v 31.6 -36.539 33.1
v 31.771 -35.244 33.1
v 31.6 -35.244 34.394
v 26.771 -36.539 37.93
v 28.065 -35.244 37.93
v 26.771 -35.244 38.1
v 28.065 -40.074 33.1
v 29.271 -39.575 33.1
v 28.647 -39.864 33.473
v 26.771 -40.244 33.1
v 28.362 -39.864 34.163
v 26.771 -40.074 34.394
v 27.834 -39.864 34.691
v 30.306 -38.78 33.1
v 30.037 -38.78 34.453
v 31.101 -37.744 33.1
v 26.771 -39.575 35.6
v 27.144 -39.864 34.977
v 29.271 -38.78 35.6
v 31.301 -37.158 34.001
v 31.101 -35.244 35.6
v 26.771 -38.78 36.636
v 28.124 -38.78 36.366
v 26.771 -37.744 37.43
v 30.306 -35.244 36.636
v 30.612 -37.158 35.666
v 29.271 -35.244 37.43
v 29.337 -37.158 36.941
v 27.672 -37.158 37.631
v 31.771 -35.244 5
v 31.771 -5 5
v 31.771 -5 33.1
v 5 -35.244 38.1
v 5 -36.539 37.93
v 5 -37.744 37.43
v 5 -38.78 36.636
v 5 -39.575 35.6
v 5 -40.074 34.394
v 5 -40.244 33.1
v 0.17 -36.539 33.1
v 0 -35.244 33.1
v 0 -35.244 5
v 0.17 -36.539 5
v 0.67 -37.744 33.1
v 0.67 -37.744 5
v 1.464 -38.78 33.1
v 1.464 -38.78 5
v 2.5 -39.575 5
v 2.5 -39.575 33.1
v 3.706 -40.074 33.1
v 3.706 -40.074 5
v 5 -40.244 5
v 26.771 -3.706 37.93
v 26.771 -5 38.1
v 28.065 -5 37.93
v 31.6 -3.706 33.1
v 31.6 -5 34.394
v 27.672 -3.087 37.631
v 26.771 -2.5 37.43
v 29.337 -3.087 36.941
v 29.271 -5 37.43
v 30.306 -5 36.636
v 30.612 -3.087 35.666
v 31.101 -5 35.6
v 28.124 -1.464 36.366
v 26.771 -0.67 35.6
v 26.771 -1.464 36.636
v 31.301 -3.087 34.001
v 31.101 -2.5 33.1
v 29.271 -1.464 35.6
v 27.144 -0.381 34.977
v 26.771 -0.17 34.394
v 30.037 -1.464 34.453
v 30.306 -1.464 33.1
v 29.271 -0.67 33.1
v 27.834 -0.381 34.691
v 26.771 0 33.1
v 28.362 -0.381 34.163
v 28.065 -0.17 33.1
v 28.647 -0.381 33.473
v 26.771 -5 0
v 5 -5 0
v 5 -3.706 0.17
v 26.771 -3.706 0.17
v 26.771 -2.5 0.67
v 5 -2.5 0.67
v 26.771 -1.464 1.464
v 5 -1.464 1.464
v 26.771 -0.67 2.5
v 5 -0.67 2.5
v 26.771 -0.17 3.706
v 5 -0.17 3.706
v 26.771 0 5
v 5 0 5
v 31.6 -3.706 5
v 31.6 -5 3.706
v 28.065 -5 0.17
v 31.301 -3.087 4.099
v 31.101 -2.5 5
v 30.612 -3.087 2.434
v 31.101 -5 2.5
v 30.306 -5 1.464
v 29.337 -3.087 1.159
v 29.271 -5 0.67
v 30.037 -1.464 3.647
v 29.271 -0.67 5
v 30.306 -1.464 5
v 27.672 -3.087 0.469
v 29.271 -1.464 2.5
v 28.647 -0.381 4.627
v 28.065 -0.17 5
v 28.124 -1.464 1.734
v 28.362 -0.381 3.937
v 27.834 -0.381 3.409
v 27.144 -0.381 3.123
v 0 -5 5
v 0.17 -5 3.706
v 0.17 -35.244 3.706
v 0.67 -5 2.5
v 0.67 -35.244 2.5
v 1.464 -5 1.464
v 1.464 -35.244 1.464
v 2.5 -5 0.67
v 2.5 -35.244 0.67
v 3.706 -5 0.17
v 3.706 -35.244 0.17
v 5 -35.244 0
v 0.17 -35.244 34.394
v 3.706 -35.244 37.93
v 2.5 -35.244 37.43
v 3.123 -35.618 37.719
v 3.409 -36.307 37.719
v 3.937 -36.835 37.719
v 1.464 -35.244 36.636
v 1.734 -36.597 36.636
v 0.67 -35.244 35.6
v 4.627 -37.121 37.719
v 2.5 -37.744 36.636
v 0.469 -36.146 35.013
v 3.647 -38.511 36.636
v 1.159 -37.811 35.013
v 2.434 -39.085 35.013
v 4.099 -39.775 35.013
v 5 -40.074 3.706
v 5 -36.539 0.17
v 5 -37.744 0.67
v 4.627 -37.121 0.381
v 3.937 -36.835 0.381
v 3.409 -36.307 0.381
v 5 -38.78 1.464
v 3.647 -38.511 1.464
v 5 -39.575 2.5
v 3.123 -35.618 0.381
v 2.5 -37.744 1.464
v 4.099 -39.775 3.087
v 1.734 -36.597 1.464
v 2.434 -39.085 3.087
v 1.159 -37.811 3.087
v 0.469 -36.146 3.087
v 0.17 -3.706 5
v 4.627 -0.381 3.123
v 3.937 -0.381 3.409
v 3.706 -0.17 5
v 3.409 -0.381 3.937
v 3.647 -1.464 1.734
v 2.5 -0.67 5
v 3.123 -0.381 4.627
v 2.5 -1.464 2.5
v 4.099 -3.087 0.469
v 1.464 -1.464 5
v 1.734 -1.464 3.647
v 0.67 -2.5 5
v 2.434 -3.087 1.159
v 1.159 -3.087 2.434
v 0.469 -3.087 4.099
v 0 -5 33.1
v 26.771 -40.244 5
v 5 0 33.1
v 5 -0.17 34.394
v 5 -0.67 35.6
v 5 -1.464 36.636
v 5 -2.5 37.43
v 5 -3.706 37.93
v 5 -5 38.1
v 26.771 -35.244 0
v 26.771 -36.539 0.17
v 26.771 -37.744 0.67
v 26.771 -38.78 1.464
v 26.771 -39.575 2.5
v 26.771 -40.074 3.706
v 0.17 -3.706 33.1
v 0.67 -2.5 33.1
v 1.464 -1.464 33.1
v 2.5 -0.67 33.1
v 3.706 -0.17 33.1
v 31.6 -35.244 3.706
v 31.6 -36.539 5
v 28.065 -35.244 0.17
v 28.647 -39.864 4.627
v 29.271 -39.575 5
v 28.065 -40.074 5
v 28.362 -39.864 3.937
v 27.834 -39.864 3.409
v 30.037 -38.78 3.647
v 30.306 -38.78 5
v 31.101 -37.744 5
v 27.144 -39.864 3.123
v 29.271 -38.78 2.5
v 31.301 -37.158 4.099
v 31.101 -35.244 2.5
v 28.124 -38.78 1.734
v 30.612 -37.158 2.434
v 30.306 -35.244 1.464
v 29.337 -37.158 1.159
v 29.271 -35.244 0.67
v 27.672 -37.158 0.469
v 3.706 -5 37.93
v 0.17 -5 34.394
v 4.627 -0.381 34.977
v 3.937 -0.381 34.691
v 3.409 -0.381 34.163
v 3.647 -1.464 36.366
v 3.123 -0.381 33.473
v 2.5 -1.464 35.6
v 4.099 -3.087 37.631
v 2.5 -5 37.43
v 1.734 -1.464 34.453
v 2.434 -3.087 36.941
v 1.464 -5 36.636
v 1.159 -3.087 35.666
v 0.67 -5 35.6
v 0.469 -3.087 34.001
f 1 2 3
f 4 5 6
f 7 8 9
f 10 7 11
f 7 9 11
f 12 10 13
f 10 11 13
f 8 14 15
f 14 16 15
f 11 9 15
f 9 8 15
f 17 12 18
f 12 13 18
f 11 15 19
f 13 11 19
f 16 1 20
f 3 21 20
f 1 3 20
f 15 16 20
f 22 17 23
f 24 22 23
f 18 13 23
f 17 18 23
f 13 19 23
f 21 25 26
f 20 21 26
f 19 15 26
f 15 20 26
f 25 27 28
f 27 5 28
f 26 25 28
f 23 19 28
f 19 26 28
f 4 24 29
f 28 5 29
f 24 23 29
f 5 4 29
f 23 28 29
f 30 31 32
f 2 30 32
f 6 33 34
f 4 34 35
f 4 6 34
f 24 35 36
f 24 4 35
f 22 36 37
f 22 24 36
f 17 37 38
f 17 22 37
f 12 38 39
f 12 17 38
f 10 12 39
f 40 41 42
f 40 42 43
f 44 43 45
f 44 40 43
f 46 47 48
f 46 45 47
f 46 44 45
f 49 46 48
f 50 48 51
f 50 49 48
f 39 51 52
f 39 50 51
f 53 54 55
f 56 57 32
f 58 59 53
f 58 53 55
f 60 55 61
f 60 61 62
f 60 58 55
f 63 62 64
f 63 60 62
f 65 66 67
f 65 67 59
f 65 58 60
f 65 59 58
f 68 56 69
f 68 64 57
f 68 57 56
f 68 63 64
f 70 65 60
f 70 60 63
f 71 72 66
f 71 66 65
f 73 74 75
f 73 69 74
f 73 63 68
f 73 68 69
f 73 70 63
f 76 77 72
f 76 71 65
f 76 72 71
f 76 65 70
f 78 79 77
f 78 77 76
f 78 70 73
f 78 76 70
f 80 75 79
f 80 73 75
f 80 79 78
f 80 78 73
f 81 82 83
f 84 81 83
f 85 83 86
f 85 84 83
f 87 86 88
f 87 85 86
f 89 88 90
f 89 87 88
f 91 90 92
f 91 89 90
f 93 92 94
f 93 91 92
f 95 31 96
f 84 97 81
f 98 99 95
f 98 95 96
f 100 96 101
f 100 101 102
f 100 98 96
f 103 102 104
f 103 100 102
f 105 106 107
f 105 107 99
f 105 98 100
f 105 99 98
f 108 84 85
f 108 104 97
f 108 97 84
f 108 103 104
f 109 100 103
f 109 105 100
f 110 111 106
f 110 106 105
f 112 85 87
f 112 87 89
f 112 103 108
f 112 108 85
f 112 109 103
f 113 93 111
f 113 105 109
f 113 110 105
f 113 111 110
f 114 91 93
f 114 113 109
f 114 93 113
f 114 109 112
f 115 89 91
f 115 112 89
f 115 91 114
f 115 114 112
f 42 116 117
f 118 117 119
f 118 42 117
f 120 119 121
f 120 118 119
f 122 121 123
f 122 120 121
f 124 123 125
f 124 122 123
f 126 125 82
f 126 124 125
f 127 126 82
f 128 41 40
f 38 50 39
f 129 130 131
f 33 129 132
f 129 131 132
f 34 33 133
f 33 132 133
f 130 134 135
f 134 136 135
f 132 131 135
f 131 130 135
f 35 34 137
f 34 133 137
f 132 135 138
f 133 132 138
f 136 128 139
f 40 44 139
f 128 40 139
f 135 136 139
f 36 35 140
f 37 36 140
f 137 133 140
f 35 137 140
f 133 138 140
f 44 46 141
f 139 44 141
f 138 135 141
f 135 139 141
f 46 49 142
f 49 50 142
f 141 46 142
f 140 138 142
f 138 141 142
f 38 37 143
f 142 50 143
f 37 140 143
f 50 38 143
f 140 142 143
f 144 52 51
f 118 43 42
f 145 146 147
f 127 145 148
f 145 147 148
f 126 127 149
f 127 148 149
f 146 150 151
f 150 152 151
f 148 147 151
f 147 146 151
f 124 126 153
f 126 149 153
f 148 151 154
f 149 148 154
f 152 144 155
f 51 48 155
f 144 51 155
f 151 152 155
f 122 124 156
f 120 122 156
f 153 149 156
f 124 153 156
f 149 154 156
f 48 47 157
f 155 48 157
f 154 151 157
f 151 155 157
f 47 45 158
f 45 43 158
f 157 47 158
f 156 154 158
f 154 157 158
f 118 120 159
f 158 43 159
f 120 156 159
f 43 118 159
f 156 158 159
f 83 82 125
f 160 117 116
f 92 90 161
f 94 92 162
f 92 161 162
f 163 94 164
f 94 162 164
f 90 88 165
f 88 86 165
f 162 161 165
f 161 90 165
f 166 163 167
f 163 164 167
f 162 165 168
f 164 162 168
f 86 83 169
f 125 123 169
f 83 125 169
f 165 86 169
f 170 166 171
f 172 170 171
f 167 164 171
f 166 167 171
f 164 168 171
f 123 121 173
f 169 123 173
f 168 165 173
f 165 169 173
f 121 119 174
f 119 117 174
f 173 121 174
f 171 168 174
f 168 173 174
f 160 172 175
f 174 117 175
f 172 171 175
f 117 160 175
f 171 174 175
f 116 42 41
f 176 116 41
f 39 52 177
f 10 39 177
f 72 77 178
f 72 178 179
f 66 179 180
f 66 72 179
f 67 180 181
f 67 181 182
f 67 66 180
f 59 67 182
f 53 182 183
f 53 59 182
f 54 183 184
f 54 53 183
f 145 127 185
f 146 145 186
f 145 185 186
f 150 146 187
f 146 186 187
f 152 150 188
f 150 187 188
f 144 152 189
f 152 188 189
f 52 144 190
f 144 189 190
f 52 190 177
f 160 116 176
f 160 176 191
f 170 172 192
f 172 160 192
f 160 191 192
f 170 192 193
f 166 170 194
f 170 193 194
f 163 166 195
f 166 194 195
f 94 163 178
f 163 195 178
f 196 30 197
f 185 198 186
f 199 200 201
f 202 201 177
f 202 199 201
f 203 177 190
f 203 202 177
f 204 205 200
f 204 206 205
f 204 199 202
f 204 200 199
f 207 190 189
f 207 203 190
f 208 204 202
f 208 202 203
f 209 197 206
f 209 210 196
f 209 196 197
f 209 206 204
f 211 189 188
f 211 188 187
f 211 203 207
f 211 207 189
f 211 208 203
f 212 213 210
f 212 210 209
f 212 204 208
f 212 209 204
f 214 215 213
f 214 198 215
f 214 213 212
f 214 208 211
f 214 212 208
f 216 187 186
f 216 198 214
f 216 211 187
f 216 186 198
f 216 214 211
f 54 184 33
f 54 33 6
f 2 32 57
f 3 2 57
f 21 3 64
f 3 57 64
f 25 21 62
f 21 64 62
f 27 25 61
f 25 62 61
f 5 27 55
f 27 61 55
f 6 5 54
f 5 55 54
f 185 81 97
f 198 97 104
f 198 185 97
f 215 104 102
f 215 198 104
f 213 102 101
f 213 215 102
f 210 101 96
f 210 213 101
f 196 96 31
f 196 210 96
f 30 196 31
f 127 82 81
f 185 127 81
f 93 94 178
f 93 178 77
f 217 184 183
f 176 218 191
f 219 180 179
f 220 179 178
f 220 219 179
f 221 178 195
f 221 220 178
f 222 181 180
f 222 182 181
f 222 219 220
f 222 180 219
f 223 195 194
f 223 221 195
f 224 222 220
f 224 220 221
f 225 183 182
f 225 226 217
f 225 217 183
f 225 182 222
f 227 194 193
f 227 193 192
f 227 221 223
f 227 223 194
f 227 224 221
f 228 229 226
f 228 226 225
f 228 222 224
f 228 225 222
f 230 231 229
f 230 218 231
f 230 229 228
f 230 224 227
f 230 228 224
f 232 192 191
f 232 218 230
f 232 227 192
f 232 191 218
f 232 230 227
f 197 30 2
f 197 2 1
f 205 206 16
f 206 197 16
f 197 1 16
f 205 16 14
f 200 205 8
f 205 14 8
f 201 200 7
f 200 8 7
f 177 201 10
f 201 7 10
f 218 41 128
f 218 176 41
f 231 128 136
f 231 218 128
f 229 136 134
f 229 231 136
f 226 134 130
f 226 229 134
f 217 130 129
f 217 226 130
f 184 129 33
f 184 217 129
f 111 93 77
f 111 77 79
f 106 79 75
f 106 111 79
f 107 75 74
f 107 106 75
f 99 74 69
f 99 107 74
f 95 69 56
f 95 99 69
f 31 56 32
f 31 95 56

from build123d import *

# Parameters (mm, degrees)
F0_W         = 31.7708179355
F0_H         = 27.5444276631
F1_DEPTH     = 38.1
F2_DEPTH     = 12.7
F3_R         = 5
F4_T1_DEPTH  = 28.1
F4_S5_W      = 5
F4_S5_H      = 5
F4_T6_DEPTH  = 5
F4_S11_W     = 5
F4_S11_H     = 5
F4_T12_DEPTH = 5


# Not quite as in the source:
# - a fillet or chamfer that OpenCascade refuses, or shapes differently, is made with other operations: its cross-section is extruded or revolved along the edge and cut away or added


with BuildPart() as f1:
    # F0 (on Top) → F1 (new body)
    with BuildSketch(Plane.XY):
        with Locations((15.8854089677, -13.7722138315)):
            Rectangle(F0_W, F0_H)
    extrude(amount=F1_DEPTH)

    # F2 (add): a face of the model
    f2_faces = [f1.faces().sort_by_distance(p)[0] for p in [
        (15.8854089677, -27.5444276631, 19.05),
    ]]
    extrude(f2_faces, amount=F2_DEPTH)

    # F3
    f3_edges = [f1.edges().sort_by_distance(p)[0] for p in [
        (0, -40.244428, 19.05),
        (0, -20.122214, 38.1),
        (31.770818, -20.122214, 0),
        (31.770818, -20.122214, 38.1),
        (31.770818, -40.244428, 19.05),
        (15.885409, 0, 38.1),
        (15.885409, -40.244428, 0),
        (0, -20.122214, 0),
        (15.885409, -40.244428, 38.1),
        (15.885409, 0, 0),
        (0, 0, 19.05),
    ]]
    fillet(f3_edges, radius=F3_R)

    # F4: fillet of radius 5 on 1 edges, made by hand

    # F4_s2 → F4_t1 (cut)
    with BuildSketch(Plane.XY.offset(5)):
        with BuildLine():
            ThreePointArc((26.7708179355, 0), (30.3063518414, -1.4644660941), (31.7708179355, -5))
            Line((31.7708179355, -5), (31.7708179355, 0))
            Line((31.7708179355, 0), (26.7708179355, 0))
        make_face()
    extrude(amount=F4_T1_DEPTH, mode=Mode.SUBTRACT)


with BuildPart() as f4_tool4:
    # F4_s5 → F4_t6 (new body)
    with BuildSketch(Plane.XZ.offset(5)):
        with Locations((29.2708179355, 2.5)):
            Rectangle(F4_S5_W, F4_S5_H)
    extrude(amount=-F4_T6_DEPTH)

    # F4_s7 → F4_t8 (revolve, cut)
    with BuildSketch(Plane(origin=(26.7708179355, -5, 5), x_dir=(-0.7071067812, 0, 0.7071067812), z_dir=(-0.7071067812, 0, -0.7071067812))):
        with BuildLine():
            ThreePointArc((0, -5), (5, 0), (0, 5))
            Line((0, 5), (0, -5))
        make_face()
    revolve(axis=Axis((26.7708179355, -5, 5), (0, 1, 0)), mode=Mode.SUBTRACT)


with BuildPart() as f1_1:
    add(f1.part)

    # F4_t3: cut F4_tool4
    add(f4_tool4.part, mode=Mode.SUBTRACT)


with BuildPart() as f4_tool10:
    # F4_s11 → F4_t12 (new body)
    with BuildSketch(Plane.XZ.offset(5)):
        with Locations((29.2708179355, 35.6)):
            Rectangle(F4_S11_W, F4_S11_H)
    extrude(amount=-F4_T12_DEPTH)

    # F4_s13 → F4_t14 (revolve, cut)
    with BuildSketch(Plane(origin=(26.7708179355, -5, 33.1), x_dir=(-0.7071067812, 0, -0.7071067812), z_dir=(0.7071067812, 0, -0.7071067812))):
        with BuildLine():
            ThreePointArc((0, -5), (5, 0), (0, 5))
            Line((0, 5), (0, -5))
        make_face()
    revolve(axis=Axis((26.7708179355, -5, 33.1), (0, 1, 0)), mode=Mode.SUBTRACT)


with BuildPart() as f1_2:
    add(f1_1.part)

    # F4_t9: cut F4_tool10
    add(f4_tool10.part, mode=Mode.SUBTRACT)


solid = f1_2.part
